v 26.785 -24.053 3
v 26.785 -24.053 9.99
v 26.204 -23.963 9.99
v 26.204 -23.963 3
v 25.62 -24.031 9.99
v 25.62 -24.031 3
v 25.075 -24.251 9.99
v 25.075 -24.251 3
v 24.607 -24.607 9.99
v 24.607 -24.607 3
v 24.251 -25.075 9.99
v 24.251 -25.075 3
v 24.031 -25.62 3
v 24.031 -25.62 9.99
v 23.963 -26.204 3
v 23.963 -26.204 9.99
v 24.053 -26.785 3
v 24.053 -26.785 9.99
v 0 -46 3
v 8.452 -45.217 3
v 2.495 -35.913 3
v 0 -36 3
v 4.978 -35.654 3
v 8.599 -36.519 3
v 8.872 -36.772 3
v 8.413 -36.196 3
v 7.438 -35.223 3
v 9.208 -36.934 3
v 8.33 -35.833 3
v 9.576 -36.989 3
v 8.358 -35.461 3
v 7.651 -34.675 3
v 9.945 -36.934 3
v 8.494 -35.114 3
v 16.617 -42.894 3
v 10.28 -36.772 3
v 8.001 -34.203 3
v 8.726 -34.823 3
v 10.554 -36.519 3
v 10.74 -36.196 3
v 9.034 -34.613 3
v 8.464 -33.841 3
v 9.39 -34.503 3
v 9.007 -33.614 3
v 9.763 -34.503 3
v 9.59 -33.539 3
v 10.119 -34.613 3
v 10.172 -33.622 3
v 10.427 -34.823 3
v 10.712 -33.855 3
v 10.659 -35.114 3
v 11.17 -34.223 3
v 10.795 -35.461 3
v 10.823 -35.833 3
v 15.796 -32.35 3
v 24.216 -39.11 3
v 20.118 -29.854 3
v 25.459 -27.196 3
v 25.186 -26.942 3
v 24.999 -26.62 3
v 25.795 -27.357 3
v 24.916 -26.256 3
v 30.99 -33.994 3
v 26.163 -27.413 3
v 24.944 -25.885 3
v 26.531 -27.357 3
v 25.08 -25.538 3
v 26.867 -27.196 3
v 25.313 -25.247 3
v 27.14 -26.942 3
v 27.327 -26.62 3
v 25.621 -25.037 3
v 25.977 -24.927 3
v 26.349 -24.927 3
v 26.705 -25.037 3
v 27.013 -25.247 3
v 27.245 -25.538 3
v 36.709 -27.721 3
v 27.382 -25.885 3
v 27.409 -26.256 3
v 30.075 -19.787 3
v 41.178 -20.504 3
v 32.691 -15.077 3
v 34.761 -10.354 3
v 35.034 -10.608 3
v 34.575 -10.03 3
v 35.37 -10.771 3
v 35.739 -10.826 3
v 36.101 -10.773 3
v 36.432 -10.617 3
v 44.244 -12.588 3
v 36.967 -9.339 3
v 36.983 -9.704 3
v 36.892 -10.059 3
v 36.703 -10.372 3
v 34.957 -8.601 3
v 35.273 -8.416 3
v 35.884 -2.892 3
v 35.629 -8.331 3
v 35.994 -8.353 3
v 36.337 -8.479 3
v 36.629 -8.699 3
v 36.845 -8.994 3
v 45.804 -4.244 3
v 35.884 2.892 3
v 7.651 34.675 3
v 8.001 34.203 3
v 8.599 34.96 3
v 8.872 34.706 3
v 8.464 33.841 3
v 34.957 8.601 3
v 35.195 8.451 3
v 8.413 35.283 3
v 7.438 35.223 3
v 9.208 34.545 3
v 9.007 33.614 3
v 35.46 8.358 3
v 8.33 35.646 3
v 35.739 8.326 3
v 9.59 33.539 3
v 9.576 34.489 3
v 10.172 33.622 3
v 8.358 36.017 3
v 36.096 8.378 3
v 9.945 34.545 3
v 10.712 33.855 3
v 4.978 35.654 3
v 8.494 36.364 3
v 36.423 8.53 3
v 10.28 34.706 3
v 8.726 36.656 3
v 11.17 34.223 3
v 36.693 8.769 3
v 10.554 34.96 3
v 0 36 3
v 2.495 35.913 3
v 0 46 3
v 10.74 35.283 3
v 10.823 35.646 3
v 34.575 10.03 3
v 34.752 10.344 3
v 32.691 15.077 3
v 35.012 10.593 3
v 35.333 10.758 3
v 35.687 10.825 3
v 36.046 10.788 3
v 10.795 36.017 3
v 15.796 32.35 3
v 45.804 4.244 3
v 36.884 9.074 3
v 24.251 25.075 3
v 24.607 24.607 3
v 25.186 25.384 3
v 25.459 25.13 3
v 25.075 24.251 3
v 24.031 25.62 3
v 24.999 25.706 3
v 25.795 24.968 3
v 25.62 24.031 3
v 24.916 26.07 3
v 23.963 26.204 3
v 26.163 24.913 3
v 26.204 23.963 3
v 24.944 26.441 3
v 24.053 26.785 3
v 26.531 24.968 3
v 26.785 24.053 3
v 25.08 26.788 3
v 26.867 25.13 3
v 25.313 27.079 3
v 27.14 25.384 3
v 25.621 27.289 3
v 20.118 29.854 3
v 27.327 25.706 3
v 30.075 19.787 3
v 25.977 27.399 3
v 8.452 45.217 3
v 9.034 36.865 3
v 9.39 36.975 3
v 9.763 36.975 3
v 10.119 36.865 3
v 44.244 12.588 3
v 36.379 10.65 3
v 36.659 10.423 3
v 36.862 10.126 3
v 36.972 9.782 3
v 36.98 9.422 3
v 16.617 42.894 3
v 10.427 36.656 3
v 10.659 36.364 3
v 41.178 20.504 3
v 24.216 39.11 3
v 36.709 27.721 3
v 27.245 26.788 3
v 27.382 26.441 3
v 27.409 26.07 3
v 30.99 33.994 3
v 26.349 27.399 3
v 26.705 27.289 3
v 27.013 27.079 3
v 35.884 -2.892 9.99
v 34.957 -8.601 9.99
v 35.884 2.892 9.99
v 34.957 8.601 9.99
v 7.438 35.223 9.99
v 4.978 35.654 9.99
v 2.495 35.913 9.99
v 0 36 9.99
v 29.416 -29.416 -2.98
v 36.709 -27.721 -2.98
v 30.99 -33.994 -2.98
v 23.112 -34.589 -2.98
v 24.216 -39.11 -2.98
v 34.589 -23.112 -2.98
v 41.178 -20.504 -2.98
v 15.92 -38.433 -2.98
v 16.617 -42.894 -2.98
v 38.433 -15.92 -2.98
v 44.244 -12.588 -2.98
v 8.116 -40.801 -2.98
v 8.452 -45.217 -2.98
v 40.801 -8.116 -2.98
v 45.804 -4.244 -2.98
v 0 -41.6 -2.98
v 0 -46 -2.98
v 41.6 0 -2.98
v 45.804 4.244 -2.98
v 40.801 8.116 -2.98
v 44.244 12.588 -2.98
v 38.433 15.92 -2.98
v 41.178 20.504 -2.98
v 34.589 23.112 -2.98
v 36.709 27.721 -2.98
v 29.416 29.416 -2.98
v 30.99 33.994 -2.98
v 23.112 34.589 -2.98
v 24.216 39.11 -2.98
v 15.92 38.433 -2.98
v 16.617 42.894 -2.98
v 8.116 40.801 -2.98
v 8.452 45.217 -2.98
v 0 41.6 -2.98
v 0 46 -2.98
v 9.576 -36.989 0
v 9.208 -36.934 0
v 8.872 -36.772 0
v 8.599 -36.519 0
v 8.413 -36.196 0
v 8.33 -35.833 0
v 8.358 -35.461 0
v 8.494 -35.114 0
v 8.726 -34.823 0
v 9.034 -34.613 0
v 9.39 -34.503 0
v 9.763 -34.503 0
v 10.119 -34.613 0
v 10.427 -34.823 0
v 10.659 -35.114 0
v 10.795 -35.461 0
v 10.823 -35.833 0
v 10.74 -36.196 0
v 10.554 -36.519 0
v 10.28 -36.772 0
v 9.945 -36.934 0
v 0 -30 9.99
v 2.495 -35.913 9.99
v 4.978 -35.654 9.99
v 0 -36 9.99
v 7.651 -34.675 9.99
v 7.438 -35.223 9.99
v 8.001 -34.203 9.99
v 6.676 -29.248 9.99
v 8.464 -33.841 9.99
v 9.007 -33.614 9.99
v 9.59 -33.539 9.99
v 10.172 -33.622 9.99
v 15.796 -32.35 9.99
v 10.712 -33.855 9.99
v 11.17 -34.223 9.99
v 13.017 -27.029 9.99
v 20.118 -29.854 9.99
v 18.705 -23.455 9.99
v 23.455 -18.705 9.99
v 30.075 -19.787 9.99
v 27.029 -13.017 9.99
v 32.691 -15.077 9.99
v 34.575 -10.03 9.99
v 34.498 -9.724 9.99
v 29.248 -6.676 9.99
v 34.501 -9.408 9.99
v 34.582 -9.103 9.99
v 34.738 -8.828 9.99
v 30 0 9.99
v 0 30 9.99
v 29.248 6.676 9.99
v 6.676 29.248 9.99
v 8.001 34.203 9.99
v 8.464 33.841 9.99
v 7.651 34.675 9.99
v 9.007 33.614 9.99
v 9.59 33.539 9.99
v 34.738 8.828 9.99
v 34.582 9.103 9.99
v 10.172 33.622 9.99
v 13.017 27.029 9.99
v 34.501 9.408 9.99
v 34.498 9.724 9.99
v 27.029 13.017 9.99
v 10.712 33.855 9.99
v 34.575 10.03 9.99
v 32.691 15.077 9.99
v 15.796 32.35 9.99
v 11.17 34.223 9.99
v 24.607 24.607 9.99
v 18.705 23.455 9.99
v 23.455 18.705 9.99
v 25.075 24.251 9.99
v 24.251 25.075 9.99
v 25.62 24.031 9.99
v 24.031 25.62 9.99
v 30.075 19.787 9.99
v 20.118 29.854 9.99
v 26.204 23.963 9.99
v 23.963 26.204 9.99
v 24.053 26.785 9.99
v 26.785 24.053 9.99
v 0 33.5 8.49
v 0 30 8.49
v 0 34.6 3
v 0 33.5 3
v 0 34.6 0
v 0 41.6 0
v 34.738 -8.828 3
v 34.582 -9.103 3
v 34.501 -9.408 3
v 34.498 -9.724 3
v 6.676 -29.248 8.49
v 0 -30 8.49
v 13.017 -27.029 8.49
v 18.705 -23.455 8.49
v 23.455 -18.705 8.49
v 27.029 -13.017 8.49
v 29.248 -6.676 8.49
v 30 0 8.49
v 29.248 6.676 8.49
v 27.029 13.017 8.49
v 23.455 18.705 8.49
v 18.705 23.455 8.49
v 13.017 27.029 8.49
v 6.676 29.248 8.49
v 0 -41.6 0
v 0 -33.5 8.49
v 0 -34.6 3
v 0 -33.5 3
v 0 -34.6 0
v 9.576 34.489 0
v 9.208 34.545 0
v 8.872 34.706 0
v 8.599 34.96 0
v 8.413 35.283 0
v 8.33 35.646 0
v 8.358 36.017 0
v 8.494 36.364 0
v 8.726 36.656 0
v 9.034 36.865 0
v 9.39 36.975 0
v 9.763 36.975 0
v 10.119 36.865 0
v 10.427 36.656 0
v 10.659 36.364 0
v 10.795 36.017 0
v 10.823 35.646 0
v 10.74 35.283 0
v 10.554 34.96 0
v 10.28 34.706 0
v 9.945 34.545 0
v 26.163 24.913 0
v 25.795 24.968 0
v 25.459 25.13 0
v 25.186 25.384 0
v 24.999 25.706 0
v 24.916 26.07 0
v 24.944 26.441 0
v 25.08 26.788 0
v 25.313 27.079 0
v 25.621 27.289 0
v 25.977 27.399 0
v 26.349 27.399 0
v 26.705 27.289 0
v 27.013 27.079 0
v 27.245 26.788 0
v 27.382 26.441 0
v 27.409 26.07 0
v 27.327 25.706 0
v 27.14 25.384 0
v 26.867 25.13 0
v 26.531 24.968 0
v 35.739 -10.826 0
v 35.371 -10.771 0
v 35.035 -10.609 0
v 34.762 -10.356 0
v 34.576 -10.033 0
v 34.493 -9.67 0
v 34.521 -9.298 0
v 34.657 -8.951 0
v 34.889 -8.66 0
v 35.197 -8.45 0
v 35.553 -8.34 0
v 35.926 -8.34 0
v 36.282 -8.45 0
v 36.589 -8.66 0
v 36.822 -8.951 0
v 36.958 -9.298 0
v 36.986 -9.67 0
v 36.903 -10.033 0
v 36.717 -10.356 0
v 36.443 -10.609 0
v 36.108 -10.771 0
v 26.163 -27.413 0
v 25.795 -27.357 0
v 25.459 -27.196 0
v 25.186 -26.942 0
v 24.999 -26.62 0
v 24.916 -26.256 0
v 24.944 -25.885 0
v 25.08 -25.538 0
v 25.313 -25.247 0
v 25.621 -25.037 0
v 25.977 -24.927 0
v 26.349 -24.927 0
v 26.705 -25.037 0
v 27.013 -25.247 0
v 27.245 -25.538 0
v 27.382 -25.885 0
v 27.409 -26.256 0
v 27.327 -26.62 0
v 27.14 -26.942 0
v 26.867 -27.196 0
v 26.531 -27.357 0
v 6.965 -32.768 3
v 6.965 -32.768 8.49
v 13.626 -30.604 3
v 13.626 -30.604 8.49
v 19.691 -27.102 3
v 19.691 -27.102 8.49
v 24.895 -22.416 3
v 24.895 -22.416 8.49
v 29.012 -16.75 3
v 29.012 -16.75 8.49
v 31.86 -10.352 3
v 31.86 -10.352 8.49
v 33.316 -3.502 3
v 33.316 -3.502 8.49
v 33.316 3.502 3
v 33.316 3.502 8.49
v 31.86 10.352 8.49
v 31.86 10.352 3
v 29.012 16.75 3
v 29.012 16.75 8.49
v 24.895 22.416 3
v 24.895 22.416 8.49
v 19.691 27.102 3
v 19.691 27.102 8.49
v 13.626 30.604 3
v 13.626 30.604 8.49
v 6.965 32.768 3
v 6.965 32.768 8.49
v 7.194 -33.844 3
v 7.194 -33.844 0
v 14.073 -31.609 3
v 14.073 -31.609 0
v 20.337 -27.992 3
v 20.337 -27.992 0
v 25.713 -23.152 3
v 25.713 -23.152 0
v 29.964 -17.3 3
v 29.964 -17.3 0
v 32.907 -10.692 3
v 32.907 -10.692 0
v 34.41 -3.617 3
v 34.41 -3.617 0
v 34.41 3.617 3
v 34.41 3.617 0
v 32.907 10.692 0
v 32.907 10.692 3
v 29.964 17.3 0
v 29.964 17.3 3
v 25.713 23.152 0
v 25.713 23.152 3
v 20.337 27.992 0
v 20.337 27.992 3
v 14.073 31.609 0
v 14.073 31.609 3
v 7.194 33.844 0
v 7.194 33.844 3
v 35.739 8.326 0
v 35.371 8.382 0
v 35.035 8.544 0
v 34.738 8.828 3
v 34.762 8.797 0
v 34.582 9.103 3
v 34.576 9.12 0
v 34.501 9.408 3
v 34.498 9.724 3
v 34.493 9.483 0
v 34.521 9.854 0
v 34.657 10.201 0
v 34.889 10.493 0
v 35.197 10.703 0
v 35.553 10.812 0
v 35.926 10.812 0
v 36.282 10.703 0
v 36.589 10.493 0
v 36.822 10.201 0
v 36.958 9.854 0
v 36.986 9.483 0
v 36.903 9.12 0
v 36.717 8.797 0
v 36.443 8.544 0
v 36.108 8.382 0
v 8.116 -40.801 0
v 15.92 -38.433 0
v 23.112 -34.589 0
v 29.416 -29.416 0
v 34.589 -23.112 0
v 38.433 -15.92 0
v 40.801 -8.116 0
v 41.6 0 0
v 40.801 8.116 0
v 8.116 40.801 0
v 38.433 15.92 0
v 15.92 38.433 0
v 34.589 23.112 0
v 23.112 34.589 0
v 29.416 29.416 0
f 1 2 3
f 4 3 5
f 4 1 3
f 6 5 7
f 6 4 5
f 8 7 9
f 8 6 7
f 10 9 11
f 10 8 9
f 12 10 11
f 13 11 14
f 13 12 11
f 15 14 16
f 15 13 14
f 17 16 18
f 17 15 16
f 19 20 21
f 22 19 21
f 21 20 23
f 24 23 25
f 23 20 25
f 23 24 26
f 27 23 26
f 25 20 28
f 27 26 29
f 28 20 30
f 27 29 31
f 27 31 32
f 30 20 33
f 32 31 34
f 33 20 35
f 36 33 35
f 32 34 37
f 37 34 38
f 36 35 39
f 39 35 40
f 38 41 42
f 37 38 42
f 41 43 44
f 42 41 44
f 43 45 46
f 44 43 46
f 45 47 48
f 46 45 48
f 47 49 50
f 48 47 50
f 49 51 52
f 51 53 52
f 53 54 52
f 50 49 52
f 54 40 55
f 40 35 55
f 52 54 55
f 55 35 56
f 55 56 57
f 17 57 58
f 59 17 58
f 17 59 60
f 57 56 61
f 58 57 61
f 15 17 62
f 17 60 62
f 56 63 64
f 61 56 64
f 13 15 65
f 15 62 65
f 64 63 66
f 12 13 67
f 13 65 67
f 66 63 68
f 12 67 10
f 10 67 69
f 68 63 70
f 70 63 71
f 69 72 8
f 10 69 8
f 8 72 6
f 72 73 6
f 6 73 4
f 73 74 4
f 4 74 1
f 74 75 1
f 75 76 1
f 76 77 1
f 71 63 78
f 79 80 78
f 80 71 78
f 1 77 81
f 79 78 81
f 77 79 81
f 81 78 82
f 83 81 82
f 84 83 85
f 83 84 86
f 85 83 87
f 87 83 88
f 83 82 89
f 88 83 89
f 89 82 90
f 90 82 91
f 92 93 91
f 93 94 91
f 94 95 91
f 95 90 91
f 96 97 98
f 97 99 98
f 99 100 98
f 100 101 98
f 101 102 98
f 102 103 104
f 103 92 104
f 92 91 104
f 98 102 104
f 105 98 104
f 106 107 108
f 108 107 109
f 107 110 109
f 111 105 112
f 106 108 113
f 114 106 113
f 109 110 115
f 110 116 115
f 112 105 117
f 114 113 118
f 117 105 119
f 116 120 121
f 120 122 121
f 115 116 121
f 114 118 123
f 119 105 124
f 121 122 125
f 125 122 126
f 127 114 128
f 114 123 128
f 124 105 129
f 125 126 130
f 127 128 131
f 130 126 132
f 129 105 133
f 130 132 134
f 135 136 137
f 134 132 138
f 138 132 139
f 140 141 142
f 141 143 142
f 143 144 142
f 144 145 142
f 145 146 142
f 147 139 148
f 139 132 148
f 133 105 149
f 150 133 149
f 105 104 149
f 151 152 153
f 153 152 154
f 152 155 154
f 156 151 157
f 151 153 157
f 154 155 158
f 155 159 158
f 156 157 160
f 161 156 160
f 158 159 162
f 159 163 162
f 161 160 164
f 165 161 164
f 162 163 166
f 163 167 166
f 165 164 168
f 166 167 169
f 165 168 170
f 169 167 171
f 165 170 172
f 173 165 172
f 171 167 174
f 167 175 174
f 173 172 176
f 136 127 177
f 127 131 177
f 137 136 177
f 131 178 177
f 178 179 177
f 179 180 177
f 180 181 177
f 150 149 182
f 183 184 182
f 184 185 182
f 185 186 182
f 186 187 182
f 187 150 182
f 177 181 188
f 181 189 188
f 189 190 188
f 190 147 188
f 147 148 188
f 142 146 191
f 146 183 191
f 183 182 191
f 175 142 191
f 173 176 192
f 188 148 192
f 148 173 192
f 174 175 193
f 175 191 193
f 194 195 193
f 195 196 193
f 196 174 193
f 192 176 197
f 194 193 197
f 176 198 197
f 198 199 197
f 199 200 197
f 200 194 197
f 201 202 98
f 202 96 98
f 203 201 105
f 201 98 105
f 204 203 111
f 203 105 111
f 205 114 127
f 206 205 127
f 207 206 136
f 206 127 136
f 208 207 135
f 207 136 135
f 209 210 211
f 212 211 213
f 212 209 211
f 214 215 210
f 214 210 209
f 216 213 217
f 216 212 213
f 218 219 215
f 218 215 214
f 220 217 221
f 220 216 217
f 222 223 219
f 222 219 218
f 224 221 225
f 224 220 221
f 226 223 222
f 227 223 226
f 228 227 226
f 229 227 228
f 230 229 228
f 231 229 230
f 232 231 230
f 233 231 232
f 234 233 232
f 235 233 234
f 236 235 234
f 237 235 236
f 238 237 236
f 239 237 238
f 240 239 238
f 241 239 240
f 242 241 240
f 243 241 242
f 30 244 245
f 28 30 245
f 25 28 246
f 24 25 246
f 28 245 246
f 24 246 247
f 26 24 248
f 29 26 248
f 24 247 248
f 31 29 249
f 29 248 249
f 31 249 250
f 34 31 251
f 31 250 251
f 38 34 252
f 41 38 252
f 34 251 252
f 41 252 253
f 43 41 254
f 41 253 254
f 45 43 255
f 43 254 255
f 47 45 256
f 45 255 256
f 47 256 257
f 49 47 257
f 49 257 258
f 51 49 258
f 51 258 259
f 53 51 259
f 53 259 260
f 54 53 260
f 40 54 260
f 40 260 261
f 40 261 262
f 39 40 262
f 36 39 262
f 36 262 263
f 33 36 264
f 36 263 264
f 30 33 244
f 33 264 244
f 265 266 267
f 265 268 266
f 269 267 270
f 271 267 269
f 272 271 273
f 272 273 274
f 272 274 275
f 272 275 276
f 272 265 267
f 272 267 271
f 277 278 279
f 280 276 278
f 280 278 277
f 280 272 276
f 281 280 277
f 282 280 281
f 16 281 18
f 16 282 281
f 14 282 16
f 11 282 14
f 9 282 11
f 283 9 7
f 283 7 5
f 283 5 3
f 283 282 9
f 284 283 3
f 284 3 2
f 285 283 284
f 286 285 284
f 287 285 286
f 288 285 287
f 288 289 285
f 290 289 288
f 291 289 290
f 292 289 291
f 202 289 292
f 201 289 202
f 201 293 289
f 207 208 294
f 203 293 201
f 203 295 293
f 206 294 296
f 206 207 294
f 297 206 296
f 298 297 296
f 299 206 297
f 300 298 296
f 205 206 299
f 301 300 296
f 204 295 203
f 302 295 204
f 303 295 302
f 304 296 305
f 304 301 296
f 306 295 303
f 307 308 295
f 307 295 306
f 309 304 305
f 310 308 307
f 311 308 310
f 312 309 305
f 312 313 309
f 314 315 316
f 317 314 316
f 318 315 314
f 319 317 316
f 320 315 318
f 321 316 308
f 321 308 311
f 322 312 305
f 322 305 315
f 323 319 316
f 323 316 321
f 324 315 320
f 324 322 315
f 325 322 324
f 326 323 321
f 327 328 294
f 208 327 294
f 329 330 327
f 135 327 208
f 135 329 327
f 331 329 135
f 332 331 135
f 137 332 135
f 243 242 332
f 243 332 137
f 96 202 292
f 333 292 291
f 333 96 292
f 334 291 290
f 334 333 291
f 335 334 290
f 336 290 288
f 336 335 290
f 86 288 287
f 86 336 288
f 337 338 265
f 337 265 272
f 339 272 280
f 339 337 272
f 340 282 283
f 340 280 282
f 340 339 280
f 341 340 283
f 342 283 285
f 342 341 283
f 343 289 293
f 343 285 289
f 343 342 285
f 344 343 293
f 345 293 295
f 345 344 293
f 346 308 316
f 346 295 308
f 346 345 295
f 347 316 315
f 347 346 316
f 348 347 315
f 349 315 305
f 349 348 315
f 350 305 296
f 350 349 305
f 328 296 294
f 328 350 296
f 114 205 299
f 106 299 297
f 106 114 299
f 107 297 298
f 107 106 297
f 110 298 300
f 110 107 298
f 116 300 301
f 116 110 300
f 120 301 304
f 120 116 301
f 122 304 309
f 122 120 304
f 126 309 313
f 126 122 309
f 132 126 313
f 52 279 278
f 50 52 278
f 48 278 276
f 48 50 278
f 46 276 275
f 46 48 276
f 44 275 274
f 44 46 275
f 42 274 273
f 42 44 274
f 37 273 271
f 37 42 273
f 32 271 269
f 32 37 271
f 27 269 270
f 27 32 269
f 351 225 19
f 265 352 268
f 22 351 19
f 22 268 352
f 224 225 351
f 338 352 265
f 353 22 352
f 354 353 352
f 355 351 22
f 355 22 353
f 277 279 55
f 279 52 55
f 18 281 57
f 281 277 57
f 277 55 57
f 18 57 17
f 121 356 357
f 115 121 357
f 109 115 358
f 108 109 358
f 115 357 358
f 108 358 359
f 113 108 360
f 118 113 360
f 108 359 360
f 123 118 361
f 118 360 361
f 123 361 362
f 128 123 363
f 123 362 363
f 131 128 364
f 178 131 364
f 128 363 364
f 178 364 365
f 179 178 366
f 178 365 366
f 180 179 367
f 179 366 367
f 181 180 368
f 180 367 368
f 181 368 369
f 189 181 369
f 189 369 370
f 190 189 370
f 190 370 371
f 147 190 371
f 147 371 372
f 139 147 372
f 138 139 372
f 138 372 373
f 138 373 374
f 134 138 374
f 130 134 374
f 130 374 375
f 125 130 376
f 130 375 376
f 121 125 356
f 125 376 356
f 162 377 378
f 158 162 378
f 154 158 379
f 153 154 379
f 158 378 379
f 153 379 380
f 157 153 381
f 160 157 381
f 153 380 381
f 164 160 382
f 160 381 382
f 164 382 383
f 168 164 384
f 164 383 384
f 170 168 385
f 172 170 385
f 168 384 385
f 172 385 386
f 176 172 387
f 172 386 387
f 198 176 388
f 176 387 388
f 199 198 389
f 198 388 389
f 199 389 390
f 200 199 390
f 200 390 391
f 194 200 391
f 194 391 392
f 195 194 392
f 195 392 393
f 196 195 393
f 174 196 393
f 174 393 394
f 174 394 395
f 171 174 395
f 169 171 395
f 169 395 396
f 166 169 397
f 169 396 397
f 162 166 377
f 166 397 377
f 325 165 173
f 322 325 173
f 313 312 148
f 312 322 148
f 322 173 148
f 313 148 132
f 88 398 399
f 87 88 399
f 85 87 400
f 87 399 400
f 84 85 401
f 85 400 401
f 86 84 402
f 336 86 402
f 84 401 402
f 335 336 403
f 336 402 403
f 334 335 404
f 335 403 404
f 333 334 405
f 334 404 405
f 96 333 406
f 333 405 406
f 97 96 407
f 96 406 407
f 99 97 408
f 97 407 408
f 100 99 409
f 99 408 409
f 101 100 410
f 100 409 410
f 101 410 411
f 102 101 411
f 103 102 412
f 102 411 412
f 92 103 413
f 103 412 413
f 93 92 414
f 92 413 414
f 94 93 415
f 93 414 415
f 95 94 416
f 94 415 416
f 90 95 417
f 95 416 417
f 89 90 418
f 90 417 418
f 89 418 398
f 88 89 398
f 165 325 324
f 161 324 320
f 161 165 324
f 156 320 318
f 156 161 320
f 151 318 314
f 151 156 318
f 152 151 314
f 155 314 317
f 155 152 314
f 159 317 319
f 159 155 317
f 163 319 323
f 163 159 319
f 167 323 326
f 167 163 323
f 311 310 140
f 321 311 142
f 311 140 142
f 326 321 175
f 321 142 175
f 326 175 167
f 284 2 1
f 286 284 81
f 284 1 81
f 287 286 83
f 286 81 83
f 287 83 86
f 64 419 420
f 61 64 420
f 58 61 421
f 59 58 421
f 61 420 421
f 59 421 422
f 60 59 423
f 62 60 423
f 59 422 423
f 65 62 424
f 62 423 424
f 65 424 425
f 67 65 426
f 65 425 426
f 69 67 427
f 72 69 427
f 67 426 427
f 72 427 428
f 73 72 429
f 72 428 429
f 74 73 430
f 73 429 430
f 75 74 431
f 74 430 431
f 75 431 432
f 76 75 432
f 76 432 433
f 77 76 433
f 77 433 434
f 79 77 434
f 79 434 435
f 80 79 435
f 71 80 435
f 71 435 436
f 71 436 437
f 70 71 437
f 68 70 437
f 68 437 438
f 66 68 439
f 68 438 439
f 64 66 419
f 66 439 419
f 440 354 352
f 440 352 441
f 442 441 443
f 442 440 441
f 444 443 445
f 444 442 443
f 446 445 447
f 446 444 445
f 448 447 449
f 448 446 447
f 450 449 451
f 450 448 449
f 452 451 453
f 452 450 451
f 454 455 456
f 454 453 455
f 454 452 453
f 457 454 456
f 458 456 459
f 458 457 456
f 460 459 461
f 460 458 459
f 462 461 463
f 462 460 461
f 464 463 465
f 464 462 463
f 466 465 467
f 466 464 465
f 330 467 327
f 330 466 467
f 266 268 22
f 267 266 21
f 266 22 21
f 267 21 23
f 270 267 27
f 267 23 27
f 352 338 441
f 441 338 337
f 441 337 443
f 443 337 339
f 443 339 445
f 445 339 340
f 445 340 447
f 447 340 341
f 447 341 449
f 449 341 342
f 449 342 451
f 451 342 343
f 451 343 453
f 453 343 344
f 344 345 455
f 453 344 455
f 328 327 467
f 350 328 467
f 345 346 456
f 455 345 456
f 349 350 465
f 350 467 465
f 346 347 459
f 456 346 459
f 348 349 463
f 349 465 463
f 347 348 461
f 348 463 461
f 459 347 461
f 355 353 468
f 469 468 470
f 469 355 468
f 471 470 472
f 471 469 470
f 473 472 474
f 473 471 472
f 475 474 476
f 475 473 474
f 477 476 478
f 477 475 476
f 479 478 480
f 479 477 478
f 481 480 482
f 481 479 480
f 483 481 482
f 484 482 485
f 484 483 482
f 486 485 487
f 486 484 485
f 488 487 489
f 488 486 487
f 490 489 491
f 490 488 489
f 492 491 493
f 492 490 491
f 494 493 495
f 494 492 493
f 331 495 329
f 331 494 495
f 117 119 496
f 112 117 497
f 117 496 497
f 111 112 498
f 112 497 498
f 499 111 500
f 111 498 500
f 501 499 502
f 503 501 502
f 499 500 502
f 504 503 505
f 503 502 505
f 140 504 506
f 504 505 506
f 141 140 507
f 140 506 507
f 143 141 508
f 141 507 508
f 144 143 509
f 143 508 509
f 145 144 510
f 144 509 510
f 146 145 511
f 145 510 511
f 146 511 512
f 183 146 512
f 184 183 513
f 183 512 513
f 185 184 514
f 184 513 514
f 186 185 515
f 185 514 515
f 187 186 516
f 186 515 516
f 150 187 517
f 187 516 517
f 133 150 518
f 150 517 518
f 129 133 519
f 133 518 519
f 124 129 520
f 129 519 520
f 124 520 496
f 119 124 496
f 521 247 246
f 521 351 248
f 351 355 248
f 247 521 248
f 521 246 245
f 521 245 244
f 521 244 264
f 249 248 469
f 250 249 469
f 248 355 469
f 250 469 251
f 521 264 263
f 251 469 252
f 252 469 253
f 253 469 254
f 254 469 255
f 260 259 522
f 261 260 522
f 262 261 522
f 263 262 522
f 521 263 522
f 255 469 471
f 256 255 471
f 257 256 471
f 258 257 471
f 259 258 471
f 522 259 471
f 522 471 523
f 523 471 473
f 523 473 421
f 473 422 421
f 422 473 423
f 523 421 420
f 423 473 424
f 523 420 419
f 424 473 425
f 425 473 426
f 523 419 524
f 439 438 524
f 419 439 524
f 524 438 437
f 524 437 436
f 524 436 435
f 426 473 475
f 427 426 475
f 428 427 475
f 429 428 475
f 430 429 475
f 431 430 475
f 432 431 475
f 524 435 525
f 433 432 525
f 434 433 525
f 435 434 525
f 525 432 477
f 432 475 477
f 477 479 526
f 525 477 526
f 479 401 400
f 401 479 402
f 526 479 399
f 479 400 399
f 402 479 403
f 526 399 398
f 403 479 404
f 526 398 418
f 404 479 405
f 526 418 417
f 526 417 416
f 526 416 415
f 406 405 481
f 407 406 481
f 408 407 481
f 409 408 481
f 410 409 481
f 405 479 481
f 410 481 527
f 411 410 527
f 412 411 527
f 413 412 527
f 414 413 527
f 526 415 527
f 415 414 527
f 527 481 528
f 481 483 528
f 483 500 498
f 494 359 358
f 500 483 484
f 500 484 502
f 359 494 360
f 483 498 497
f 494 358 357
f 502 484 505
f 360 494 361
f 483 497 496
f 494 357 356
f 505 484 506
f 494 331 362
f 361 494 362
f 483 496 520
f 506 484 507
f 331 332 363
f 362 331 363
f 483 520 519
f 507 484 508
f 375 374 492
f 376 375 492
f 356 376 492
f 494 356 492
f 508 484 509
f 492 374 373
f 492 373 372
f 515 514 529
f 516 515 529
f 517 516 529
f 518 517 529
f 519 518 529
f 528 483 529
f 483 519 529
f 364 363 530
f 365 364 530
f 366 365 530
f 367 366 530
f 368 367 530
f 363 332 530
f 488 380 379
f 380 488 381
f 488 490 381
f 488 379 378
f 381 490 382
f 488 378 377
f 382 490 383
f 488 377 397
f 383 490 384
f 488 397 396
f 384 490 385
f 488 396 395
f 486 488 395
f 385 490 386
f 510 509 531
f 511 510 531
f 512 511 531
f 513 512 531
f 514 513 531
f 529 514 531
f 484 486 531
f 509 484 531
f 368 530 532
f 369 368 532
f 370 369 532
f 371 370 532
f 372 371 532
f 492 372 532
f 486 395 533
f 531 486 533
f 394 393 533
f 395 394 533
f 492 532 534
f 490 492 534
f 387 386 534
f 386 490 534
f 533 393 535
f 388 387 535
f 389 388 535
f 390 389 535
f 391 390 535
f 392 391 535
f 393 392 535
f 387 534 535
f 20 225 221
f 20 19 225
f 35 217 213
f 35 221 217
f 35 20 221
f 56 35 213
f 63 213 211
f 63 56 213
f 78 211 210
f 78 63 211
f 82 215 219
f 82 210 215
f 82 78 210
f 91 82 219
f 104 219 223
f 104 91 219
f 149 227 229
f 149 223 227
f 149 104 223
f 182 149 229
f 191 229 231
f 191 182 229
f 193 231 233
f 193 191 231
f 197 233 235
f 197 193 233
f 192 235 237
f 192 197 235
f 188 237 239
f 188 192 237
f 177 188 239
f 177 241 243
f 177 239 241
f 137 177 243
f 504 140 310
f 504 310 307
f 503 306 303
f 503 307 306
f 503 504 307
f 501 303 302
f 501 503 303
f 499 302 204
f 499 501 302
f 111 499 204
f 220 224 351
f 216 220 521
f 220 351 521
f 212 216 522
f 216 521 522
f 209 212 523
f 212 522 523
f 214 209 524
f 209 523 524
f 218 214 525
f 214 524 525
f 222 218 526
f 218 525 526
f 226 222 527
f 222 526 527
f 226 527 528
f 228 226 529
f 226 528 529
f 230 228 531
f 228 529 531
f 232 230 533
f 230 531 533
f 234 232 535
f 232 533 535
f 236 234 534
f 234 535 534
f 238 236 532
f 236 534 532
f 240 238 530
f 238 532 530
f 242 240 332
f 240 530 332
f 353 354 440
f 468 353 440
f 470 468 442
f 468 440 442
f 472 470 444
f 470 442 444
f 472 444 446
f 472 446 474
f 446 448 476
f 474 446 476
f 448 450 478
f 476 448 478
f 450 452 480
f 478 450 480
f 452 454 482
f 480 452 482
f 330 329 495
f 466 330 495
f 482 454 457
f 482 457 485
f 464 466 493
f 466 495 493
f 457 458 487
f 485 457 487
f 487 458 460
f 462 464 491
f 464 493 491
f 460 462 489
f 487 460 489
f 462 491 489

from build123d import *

# Parameters (mm, degrees)
SKETCH_3_R                   = 46
SKETCH_3_R_2                 = 34.6
EXTRUDE_2_DEPTH              = 3
SKETCH_5_R                   = 36
SKETCH_5_R_2                 = 33.5
EXTRUDE_3_DEPTH              = 5.49
SKETCH_2_R                   = 46
SKETCH_2_R_2                 = 41.6
EXTRUDE_1_DEPTH              = 2.98
SKETCH_6_R                   = 36
SKETCH_6_R_2                 = 30
EXTRUDE_4_DEPTH              = 1.5
EXTRUDE_5_DEPTH              = 3
EXTRUDE_5_DEPTH_BACK         = 2.98
SKETCH_12_W                  = 1.25
SKETCH_12_H                  = 5.98
HOLE_WIZARD_M3_1_AT_2_COUNT  = 2
HOLE_WIZARD_M3_1_AT_2_PITCH  = 64.085879878
HOLE_WIZARD_M3_1_AT_3_COUNT  = 2
HOLE_WIZARD_M3_1_AT_3_PITCH  = 71.478511138
HOLE_WIZARD_M3_1_AT_4_COUNT  = 2
HOLE_WIZARD_M3_1_AT_4_PITCH  = 73.999999995
HOLE_WIZARD_M3_1_AT_5_COUNT  = 2
HOLE_WIZARD_M3_1_AT_5_PITCH  = 19.15260934
HOLE_WIZARD_M3_1_AT_6_COUNT  = 2
HOLE_WIZARD_M3_1_AT_6_PITCH  = 36.999999998
HOLE_WIZARD_M3_1_AT_7_COUNT  = 2
HOLE_WIZARD_M3_1_AT_7_PITCH  = 52.325901805
HOLE_WIZARD_M3_1_AT_8_COUNT  = 2
HOLE_WIZARD_M3_1_AT_8_PITCH  = 71.47851114
HOLE_WIZARD_M3_1_AT_9_COUNT  = 2
HOLE_WIZARD_M3_1_AT_9_PITCH  = 64.085879872
HOLE_WIZARD_M3_1_AT_10_COUNT = 2
HOLE_WIZARD_M3_1_AT_10_PITCH = 52.325901805
HOLE_WIZARD_M3_1_AT_11_COUNT = 2
HOLE_WIZARD_M3_1_AT_11_PITCH = 36.999999994
HOLE_WIZARD_M3_1_AT_12_COUNT = 2
HOLE_WIZARD_M3_1_AT_12_PITCH = 19.152609334
CUT_EXTRUDE_1_REACH          = 8.99
SKETCH_13_R                  = 1.25
SKETCH_13_R_2                = 2.2
SKETCH_25_R                  = 3.25
CUT_EXTRUDE_9_DEPTH          = 10
EXTRUDE_7_DEPTH              = 4
EXTRUDE_7_DEPTH_BACK         = 2
FILLET_1_R                   = 5
SKETCH_27_W                  = 100
SKETCH_27_H                  = 92
CUT_EXTRUDE_10_DEPTH         = 10.99
CUT_EXTRUDE_10_DEPTH_BACK    = 40.48


with BuildPart() as part:
    # 草图3 → 凸台-拉伸2 (new body)
    with BuildSketch(Plane.XY):
        Circle(SKETCH_3_R)
        Circle(SKETCH_3_R_2, mode=Mode.SUBTRACT)
    extrude(amount=EXTRUDE_2_DEPTH)

    # 草图5 → 凸台-拉伸3 (add)
    with BuildSketch(Plane.XY.offset(3)):
        Circle(SKETCH_5_R)
        Circle(SKETCH_5_R_2, mode=Mode.SUBTRACT)
    extrude(amount=EXTRUDE_3_DEPTH)

    # 草图2 → 凸台-拉伸1 (add)
    with BuildSketch(Plane.XY):
        Circle(SKETCH_2_R)
        Circle(SKETCH_2_R_2, mode=Mode.SUBTRACT)
    extrude(amount=-EXTRUDE_1_DEPTH)

    # 草图6 → 凸台-拉伸4 (add)
    with BuildSketch(Plane.XY.offset(8.49)):
        Circle(SKETCH_6_R)
        Circle(SKETCH_6_R_2, mode=Mode.SUBTRACT)
    extrude(amount=EXTRUDE_4_DEPTH)

    # 草图8 → 凸台-拉伸5 (add, two sides)
    with BuildSketch(Plane.XY) as extrude_5_sk:
        with BuildLine():
            Line((-50, 20.008021569), (-45.01389718, 20.008021569))
            ThreePointArc((-45.01389718, 20.008021569), (-42.026432396, 20.80859551), (-39.839615313, 22.995761603))
            ThreePointArc((-39.839615313, 22.995761603), (-46, 0), (-39.839615313, -22.995761603))
            ThreePointArc((-39.839615313, -22.995761603), (-42.026432396, -20.80859551), (-45.01389718, -20.008021569))
            Line((-45.01389718, -20.008021569), (-50, -20.008021569))
            Line((-50, -20.008021569), (-50, 20.008021569))
        make_face()
    extrude(amount=EXTRUDE_5_DEPTH)
    extrude(extrude_5_sk.sketch, amount=-EXTRUDE_5_DEPTH_BACK)

    # 草图12 → M3 螺纹孔的螺纹孔钻头1 (revolve, cut)
    with BuildSketch(Plane(origin=(-35.73925557, -9.57630467, 3), x_dir=(0, -1, 0), z_dir=(1, 0, 0))):
        with Locations((0.625, 2.99)):
            Rectangle(SKETCH_12_W, SKETCH_12_H)
    hole_wizard_m3_1 = revolve(axis=Axis((-35.73925557, -9.57630467, 9.35), (0, 0, -1)), mode=Mode.SUBTRACT)

    # M3 螺纹孔的螺纹孔钻头1 at 2: M3 螺纹孔的螺纹孔钻头1 ×2
    with Locations(*[Vector(0.707106781, 0.707106781, 0) * (i * HOLE_WIZARD_M3_1_AT_2_PITCH) for i in range(1, HOLE_WIZARD_M3_1_AT_2_COUNT)]):
        add(hole_wizard_m3_1, mode=Mode.SUBTRACT)

    # M3 螺纹孔的螺纹孔钻头1 at 3: M3 螺纹孔的螺纹孔钻头1 ×2
    with Locations(*[Vector(0.866025404, 0.5, 0) * (i * HOLE_WIZARD_M3_1_AT_3_PITCH) for i in range(1, HOLE_WIZARD_M3_1_AT_3_COUNT)]):
        add(hole_wizard_m3_1, mode=Mode.SUBTRACT)

    # M3 螺纹孔的螺纹孔钻头1 at 4: M3 螺纹孔的螺纹孔钻头1 ×2
    with Locations(*[Vector(0.965925826, 0.258819045, 0) * (i * HOLE_WIZARD_M3_1_AT_4_PITCH) for i in range(1, HOLE_WIZARD_M3_1_AT_4_COUNT)]):
        add(hole_wizard_m3_1, mode=Mode.SUBTRACT)

    # M3 螺纹孔的螺纹孔钻头1 at 5: M3 螺纹孔的螺纹孔钻头1 ×2
    with Locations(*[(0, i * HOLE_WIZARD_M3_1_AT_5_PITCH, 0) for i in range(1, HOLE_WIZARD_M3_1_AT_5_COUNT)]):
        add(hole_wizard_m3_1, mode=Mode.SUBTRACT)

    # M3 螺纹孔的螺纹孔钻头1 at 6: M3 螺纹孔的螺纹孔钻头1 ×2
    with Locations(*[Vector(0.258819045, 0.965925826, 0) * (i * HOLE_WIZARD_M3_1_AT_6_PITCH) for i in range(1, HOLE_WIZARD_M3_1_AT_6_COUNT)]):
        add(hole_wizard_m3_1, mode=Mode.SUBTRACT)

    # M3 螺纹孔的螺纹孔钻头1 at 7: M3 螺纹孔的螺纹孔钻头1 ×2
    with Locations(*[Vector(0.5, 0.866025404, 0) * (i * HOLE_WIZARD_M3_1_AT_7_PITCH) for i in range(1, HOLE_WIZARD_M3_1_AT_7_COUNT)]):
        add(hole_wizard_m3_1, mode=Mode.SUBTRACT)

    # M3 螺纹孔的螺纹孔钻头1 at 8: M3 螺纹孔的螺纹孔钻头1 ×2
    with Locations(*[(i * HOLE_WIZARD_M3_1_AT_8_PITCH, 0, 0) for i in range(1, HOLE_WIZARD_M3_1_AT_8_COUNT)]):
        add(hole_wizard_m3_1, mode=Mode.SUBTRACT)

    # M3 螺纹孔的螺纹孔钻头1 at 9: M3 螺纹孔的螺纹孔钻头1 ×2
    with Locations(*[Vector(0.965925826, -0.258819045, 0) * (i * HOLE_WIZARD_M3_1_AT_9_PITCH) for i in range(1, HOLE_WIZARD_M3_1_AT_9_COUNT)]):
        add(hole_wizard_m3_1, mode=Mode.SUBTRACT)

    # M3 螺纹孔的螺纹孔钻头1 at 10: M3 螺纹孔的螺纹孔钻头1 ×2
    with Locations(*[Vector(0.866025404, -0.5, 0) * (i * HOLE_WIZARD_M3_1_AT_10_PITCH) for i in range(1, HOLE_WIZARD_M3_1_AT_10_COUNT)]):
        add(hole_wizard_m3_1, mode=Mode.SUBTRACT)

    # M3 螺纹孔的螺纹孔钻头1 at 11: M3 螺纹孔的螺纹孔钻头1 ×2
    with Locations(*[Vector(0.707106781, -0.707106781, 0) * (i * HOLE_WIZARD_M3_1_AT_11_PITCH) for i in range(1, HOLE_WIZARD_M3_1_AT_11_COUNT)]):
        add(hole_wizard_m3_1, mode=Mode.SUBTRACT)

    # M3 螺纹孔的螺纹孔钻头1 at 12: M3 螺纹孔的螺纹孔钻头1 ×2
    with Locations(*[Vector(0.5, -0.866025404, 0) * (i * HOLE_WIZARD_M3_1_AT_12_PITCH) for i in range(1, HOLE_WIZARD_M3_1_AT_12_COUNT)]):
        add(hole_wizard_m3_1, mode=Mode.SUBTRACT)

    # 草图13 → 切除-拉伸1 (cut, up to next)
    with BuildSketch(Plane.XY.offset(3), mode=Mode.PRIVATE) as cut_extrude_1_sk1:
        with Locations((-35.73925557, -9.57630467)):
            Circle(SKETCH_13_R)
    cut_extrude_1_tool1 = extrude(cut_extrude_1_sk1.sketch, amount=CUT_EXTRUDE_1_REACH, mode=Mode.PRIVATE) & part.part
    add(cut_extrude_1_tool1.solids().sort_by_distance((-35.739256, -9.576305, 3))[0], mode=Mode.SUBTRACT)
    # 草图13 → 切除-拉伸1 (cut, up to next)
    with BuildSketch(Plane.XY.offset(3), mode=Mode.PRIVATE) as cut_extrude_1_sk2:
        with Locations((-26.1629509, -26.1629509)):
            Circle(SKETCH_13_R_2)
    cut_extrude_1_tool2 = extrude(cut_extrude_1_sk2.sketch, amount=CUT_EXTRUDE_1_REACH, mode=Mode.PRIVATE) & part.part
    add(cut_extrude_1_tool2.solids().sort_by_distance((-26.162951, -26.162951, 3))[0], mode=Mode.SUBTRACT)
    # 草图13 → 切除-拉伸1 (cut, up to next)
    with BuildSketch(Plane.XY.offset(3), mode=Mode.PRIVATE) as cut_extrude_1_sk3:
        with Locations((-35.73925557, 9.57630467)):
            Circle(SKETCH_13_R)
    cut_extrude_1_tool3 = extrude(cut_extrude_1_sk3.sketch, amount=CUT_EXTRUDE_1_REACH, mode=Mode.PRIVATE) & part.part
    add(cut_extrude_1_tool3.solids().sort_by_distance((-35.739256, 9.576305, 3))[0], mode=Mode.SUBTRACT)
    # 草图13 → 切除-拉伸1 (cut, up to next)
    with BuildSketch(Plane.XY.offset(3), mode=Mode.PRIVATE) as cut_extrude_1_sk4:
        with Locations((-26.1629509, 26.1629509)):
            Circle(SKETCH_13_R_2)
    cut_extrude_1_tool4 = extrude(cut_extrude_1_sk4.sketch, amount=CUT_EXTRUDE_1_REACH, mode=Mode.PRIVATE) & part.part
    add(cut_extrude_1_tool4.solids().sort_by_distance((-26.162951, 26.162951, 3))[0], mode=Mode.SUBTRACT)
    # 草图13 → 切除-拉伸1 (cut, up to next)
    with BuildSketch(Plane.XY.offset(3), mode=Mode.PRIVATE) as cut_extrude_1_sk5:
        with Locations((-9.57630467, 35.73925557)):
            Circle(SKETCH_13_R_2)
    cut_extrude_1_tool5 = extrude(cut_extrude_1_sk5.sketch, amount=CUT_EXTRUDE_1_REACH, mode=Mode.PRIVATE) & part.part
    add(cut_extrude_1_tool5.solids().sort_by_distance((-9.576305, 35.739256, 3))[0], mode=Mode.SUBTRACT)
    # 草图13 → 切除-拉伸1 (cut, up to next)
    with BuildSketch(Plane.XY.offset(3), mode=Mode.PRIVATE) as cut_extrude_1_sk6:
        with Locations((26.1629509, 26.1629509)):
            Circle(SKETCH_13_R_2)
    cut_extrude_1_tool6 = extrude(cut_extrude_1_sk6.sketch, amount=CUT_EXTRUDE_1_REACH, mode=Mode.PRIVATE) & part.part
    add(cut_extrude_1_tool6.solids().sort_by_distance((26.162951, 26.162951, 3))[0], mode=Mode.SUBTRACT)
    # 草图13 → 切除-拉伸1 (cut, up to next)
    with BuildSketch(Plane.XY.offset(3), mode=Mode.PRIVATE) as cut_extrude_1_sk7:
        with Locations((35.73925557, 9.57630467)):
            Circle(SKETCH_13_R)
    cut_extrude_1_tool7 = extrude(cut_extrude_1_sk7.sketch, amount=CUT_EXTRUDE_1_REACH, mode=Mode.PRIVATE) & part.part
    add(cut_extrude_1_tool7.solids().sort_by_distance((35.739256, 9.576305, 3))[0], mode=Mode.SUBTRACT)
    # 草图13 → 切除-拉伸1 (cut, up to next)
    with BuildSketch(Plane.XY.offset(3), mode=Mode.PRIVATE) as cut_extrude_1_sk8:
        with Locations((35.73925557, -9.57630467)):
            Circle(SKETCH_13_R)
    cut_extrude_1_tool8 = extrude(cut_extrude_1_sk8.sketch, amount=CUT_EXTRUDE_1_REACH, mode=Mode.PRIVATE) & part.part
    add(cut_extrude_1_tool8.solids().sort_by_distance((35.739256, -9.576305, 3))[0], mode=Mode.SUBTRACT)
    # 草图13 → 切除-拉伸1 (cut, up to next)
    with BuildSketch(Plane.XY.offset(3), mode=Mode.PRIVATE) as cut_extrude_1_sk9:
        with Locations((9.57630467, -35.73925557)):
            Circle(SKETCH_13_R_2)
    cut_extrude_1_tool9 = extrude(cut_extrude_1_sk9.sketch, amount=CUT_EXTRUDE_1_REACH, mode=Mode.PRIVATE) & part.part
    add(cut_extrude_1_tool9.solids().sort_by_distance((9.576305, -35.739256, 3))[0], mode=Mode.SUBTRACT)
    # 草图13 → 切除-拉伸1 (cut, up to next)
    with BuildSketch(Plane.XY.offset(3), mode=Mode.PRIVATE) as cut_extrude_1_sk10:
        with Locations((-9.57630467, -35.73925557)):
            Circle(SKETCH_13_R_2)
    cut_extrude_1_tool10 = extrude(cut_extrude_1_sk10.sketch, amount=CUT_EXTRUDE_1_REACH, mode=Mode.PRIVATE) & part.part
    add(cut_extrude_1_tool10.solids().sort_by_distance((-9.576305, -35.739256, 3))[0], mode=Mode.SUBTRACT)
    # 草图13 → 切除-拉伸1 (cut, up to next)
    with BuildSketch(Plane.XY.offset(3), mode=Mode.PRIVATE) as cut_extrude_1_sk11:
        with Locations((9.57630467, 35.73925557)):
            Circle(SKETCH_13_R_2)
    cut_extrude_1_tool11 = extrude(cut_extrude_1_sk11.sketch, amount=CUT_EXTRUDE_1_REACH, mode=Mode.PRIVATE) & part.part
    add(cut_extrude_1_tool11.solids().sort_by_distance((9.576305, 35.739256, 3))[0], mode=Mode.SUBTRACT)
    # 草图13 → 切除-拉伸1 (cut, up to next)
    with BuildSketch(Plane.XY.offset(3), mode=Mode.PRIVATE) as cut_extrude_1_sk12:
        with Locations((26.1629509, -26.1629509)):
            Circle(SKETCH_13_R_2)
    cut_extrude_1_tool12 = extrude(cut_extrude_1_sk12.sketch, amount=CUT_EXTRUDE_1_REACH, mode=Mode.PRIVATE) & part.part
    add(cut_extrude_1_tool12.solids().sort_by_distance((26.162951, -26.162951, 3))[0], mode=Mode.SUBTRACT)

    # 草图25 → 切除-拉伸9 (cut)
    with BuildSketch(Plane.XY.offset(3)):
        with Locations((-9.57630467, 35.73925557)):
            Circle(SKETCH_25_R)
        with Locations((-26.1629509, 26.1629509)):
            Circle(SKETCH_25_R)
        with Locations((-35.73925557, 9.57630467)):
            Circle(SKETCH_25_R)
        with Locations((-35.73925557, -9.57630467)):
            Circle(SKETCH_25_R)
        with Locations((-26.1629509, -26.1629509)):
            Circle(SKETCH_25_R)
        with Locations((-9.57630467, -35.73925557)):
            Circle(SKETCH_25_R)
    extrude(amount=CUT_EXTRUDE_9_DEPTH, mode=Mode.SUBTRACT)

    # 草图26 → 凸台-拉伸7 (add, two sides)
    with BuildSketch(Plane.ZY.offset(50)) as extrude_7_sk:
        with BuildLine():
            ThreePointArc((-12.98, 26.5), (-39.48, 0), (-12.98, -26.5))
            ThreePointArc((-12.98, -26.5), (-9.999377331, -25.617338519), (-7.98, -23.254010785))
            ThreePointArc((-7.98, -23.254010785), (-5.960622669, -20.89068305), (-2.98, -20.008021569))
            Line((-2.98, -20.008021569), (3, -20.008021569))
            Line((3, -20.008021569), (3, 20.008021569))
            Line((3, 20.008021569), (-2.98, 20.008021569))
            ThreePointArc((-2.98, 20.008021569), (-5.960622669, 20.89068305), (-7.98, 23.254010785))
            ThreePointArc((-7.98, 23.254010785), (-9.999377331, 25.617338519), (-12.98, 26.5))
        make_face()
    extrude(amount=EXTRUDE_7_DEPTH)
    extrude(extrude_7_sk.sketch, amount=-EXTRUDE_7_DEPTH_BACK)

    # 圆角1
    fillet_1_edges = [part.edges().sort_by_distance(p)[0] for p in [
        (-54, 0, 3),
    ]]
    fillet(fillet_1_edges, radius=FILLET_1_R)

    # 草图27 → 切除-拉伸10 (cut, two sides)
    with BuildSketch(Plane.XY) as cut_extrude_10_sk:
        with Locations((-50, 0)):
            Rectangle(SKETCH_27_W, SKETCH_27_H)
    extrude(amount=CUT_EXTRUDE_10_DEPTH, mode=Mode.SUBTRACT)
    extrude(cut_extrude_10_sk.sketch, amount=-CUT_EXTRUDE_10_DEPTH_BACK, mode=Mode.SUBTRACT)


solid = part.part
